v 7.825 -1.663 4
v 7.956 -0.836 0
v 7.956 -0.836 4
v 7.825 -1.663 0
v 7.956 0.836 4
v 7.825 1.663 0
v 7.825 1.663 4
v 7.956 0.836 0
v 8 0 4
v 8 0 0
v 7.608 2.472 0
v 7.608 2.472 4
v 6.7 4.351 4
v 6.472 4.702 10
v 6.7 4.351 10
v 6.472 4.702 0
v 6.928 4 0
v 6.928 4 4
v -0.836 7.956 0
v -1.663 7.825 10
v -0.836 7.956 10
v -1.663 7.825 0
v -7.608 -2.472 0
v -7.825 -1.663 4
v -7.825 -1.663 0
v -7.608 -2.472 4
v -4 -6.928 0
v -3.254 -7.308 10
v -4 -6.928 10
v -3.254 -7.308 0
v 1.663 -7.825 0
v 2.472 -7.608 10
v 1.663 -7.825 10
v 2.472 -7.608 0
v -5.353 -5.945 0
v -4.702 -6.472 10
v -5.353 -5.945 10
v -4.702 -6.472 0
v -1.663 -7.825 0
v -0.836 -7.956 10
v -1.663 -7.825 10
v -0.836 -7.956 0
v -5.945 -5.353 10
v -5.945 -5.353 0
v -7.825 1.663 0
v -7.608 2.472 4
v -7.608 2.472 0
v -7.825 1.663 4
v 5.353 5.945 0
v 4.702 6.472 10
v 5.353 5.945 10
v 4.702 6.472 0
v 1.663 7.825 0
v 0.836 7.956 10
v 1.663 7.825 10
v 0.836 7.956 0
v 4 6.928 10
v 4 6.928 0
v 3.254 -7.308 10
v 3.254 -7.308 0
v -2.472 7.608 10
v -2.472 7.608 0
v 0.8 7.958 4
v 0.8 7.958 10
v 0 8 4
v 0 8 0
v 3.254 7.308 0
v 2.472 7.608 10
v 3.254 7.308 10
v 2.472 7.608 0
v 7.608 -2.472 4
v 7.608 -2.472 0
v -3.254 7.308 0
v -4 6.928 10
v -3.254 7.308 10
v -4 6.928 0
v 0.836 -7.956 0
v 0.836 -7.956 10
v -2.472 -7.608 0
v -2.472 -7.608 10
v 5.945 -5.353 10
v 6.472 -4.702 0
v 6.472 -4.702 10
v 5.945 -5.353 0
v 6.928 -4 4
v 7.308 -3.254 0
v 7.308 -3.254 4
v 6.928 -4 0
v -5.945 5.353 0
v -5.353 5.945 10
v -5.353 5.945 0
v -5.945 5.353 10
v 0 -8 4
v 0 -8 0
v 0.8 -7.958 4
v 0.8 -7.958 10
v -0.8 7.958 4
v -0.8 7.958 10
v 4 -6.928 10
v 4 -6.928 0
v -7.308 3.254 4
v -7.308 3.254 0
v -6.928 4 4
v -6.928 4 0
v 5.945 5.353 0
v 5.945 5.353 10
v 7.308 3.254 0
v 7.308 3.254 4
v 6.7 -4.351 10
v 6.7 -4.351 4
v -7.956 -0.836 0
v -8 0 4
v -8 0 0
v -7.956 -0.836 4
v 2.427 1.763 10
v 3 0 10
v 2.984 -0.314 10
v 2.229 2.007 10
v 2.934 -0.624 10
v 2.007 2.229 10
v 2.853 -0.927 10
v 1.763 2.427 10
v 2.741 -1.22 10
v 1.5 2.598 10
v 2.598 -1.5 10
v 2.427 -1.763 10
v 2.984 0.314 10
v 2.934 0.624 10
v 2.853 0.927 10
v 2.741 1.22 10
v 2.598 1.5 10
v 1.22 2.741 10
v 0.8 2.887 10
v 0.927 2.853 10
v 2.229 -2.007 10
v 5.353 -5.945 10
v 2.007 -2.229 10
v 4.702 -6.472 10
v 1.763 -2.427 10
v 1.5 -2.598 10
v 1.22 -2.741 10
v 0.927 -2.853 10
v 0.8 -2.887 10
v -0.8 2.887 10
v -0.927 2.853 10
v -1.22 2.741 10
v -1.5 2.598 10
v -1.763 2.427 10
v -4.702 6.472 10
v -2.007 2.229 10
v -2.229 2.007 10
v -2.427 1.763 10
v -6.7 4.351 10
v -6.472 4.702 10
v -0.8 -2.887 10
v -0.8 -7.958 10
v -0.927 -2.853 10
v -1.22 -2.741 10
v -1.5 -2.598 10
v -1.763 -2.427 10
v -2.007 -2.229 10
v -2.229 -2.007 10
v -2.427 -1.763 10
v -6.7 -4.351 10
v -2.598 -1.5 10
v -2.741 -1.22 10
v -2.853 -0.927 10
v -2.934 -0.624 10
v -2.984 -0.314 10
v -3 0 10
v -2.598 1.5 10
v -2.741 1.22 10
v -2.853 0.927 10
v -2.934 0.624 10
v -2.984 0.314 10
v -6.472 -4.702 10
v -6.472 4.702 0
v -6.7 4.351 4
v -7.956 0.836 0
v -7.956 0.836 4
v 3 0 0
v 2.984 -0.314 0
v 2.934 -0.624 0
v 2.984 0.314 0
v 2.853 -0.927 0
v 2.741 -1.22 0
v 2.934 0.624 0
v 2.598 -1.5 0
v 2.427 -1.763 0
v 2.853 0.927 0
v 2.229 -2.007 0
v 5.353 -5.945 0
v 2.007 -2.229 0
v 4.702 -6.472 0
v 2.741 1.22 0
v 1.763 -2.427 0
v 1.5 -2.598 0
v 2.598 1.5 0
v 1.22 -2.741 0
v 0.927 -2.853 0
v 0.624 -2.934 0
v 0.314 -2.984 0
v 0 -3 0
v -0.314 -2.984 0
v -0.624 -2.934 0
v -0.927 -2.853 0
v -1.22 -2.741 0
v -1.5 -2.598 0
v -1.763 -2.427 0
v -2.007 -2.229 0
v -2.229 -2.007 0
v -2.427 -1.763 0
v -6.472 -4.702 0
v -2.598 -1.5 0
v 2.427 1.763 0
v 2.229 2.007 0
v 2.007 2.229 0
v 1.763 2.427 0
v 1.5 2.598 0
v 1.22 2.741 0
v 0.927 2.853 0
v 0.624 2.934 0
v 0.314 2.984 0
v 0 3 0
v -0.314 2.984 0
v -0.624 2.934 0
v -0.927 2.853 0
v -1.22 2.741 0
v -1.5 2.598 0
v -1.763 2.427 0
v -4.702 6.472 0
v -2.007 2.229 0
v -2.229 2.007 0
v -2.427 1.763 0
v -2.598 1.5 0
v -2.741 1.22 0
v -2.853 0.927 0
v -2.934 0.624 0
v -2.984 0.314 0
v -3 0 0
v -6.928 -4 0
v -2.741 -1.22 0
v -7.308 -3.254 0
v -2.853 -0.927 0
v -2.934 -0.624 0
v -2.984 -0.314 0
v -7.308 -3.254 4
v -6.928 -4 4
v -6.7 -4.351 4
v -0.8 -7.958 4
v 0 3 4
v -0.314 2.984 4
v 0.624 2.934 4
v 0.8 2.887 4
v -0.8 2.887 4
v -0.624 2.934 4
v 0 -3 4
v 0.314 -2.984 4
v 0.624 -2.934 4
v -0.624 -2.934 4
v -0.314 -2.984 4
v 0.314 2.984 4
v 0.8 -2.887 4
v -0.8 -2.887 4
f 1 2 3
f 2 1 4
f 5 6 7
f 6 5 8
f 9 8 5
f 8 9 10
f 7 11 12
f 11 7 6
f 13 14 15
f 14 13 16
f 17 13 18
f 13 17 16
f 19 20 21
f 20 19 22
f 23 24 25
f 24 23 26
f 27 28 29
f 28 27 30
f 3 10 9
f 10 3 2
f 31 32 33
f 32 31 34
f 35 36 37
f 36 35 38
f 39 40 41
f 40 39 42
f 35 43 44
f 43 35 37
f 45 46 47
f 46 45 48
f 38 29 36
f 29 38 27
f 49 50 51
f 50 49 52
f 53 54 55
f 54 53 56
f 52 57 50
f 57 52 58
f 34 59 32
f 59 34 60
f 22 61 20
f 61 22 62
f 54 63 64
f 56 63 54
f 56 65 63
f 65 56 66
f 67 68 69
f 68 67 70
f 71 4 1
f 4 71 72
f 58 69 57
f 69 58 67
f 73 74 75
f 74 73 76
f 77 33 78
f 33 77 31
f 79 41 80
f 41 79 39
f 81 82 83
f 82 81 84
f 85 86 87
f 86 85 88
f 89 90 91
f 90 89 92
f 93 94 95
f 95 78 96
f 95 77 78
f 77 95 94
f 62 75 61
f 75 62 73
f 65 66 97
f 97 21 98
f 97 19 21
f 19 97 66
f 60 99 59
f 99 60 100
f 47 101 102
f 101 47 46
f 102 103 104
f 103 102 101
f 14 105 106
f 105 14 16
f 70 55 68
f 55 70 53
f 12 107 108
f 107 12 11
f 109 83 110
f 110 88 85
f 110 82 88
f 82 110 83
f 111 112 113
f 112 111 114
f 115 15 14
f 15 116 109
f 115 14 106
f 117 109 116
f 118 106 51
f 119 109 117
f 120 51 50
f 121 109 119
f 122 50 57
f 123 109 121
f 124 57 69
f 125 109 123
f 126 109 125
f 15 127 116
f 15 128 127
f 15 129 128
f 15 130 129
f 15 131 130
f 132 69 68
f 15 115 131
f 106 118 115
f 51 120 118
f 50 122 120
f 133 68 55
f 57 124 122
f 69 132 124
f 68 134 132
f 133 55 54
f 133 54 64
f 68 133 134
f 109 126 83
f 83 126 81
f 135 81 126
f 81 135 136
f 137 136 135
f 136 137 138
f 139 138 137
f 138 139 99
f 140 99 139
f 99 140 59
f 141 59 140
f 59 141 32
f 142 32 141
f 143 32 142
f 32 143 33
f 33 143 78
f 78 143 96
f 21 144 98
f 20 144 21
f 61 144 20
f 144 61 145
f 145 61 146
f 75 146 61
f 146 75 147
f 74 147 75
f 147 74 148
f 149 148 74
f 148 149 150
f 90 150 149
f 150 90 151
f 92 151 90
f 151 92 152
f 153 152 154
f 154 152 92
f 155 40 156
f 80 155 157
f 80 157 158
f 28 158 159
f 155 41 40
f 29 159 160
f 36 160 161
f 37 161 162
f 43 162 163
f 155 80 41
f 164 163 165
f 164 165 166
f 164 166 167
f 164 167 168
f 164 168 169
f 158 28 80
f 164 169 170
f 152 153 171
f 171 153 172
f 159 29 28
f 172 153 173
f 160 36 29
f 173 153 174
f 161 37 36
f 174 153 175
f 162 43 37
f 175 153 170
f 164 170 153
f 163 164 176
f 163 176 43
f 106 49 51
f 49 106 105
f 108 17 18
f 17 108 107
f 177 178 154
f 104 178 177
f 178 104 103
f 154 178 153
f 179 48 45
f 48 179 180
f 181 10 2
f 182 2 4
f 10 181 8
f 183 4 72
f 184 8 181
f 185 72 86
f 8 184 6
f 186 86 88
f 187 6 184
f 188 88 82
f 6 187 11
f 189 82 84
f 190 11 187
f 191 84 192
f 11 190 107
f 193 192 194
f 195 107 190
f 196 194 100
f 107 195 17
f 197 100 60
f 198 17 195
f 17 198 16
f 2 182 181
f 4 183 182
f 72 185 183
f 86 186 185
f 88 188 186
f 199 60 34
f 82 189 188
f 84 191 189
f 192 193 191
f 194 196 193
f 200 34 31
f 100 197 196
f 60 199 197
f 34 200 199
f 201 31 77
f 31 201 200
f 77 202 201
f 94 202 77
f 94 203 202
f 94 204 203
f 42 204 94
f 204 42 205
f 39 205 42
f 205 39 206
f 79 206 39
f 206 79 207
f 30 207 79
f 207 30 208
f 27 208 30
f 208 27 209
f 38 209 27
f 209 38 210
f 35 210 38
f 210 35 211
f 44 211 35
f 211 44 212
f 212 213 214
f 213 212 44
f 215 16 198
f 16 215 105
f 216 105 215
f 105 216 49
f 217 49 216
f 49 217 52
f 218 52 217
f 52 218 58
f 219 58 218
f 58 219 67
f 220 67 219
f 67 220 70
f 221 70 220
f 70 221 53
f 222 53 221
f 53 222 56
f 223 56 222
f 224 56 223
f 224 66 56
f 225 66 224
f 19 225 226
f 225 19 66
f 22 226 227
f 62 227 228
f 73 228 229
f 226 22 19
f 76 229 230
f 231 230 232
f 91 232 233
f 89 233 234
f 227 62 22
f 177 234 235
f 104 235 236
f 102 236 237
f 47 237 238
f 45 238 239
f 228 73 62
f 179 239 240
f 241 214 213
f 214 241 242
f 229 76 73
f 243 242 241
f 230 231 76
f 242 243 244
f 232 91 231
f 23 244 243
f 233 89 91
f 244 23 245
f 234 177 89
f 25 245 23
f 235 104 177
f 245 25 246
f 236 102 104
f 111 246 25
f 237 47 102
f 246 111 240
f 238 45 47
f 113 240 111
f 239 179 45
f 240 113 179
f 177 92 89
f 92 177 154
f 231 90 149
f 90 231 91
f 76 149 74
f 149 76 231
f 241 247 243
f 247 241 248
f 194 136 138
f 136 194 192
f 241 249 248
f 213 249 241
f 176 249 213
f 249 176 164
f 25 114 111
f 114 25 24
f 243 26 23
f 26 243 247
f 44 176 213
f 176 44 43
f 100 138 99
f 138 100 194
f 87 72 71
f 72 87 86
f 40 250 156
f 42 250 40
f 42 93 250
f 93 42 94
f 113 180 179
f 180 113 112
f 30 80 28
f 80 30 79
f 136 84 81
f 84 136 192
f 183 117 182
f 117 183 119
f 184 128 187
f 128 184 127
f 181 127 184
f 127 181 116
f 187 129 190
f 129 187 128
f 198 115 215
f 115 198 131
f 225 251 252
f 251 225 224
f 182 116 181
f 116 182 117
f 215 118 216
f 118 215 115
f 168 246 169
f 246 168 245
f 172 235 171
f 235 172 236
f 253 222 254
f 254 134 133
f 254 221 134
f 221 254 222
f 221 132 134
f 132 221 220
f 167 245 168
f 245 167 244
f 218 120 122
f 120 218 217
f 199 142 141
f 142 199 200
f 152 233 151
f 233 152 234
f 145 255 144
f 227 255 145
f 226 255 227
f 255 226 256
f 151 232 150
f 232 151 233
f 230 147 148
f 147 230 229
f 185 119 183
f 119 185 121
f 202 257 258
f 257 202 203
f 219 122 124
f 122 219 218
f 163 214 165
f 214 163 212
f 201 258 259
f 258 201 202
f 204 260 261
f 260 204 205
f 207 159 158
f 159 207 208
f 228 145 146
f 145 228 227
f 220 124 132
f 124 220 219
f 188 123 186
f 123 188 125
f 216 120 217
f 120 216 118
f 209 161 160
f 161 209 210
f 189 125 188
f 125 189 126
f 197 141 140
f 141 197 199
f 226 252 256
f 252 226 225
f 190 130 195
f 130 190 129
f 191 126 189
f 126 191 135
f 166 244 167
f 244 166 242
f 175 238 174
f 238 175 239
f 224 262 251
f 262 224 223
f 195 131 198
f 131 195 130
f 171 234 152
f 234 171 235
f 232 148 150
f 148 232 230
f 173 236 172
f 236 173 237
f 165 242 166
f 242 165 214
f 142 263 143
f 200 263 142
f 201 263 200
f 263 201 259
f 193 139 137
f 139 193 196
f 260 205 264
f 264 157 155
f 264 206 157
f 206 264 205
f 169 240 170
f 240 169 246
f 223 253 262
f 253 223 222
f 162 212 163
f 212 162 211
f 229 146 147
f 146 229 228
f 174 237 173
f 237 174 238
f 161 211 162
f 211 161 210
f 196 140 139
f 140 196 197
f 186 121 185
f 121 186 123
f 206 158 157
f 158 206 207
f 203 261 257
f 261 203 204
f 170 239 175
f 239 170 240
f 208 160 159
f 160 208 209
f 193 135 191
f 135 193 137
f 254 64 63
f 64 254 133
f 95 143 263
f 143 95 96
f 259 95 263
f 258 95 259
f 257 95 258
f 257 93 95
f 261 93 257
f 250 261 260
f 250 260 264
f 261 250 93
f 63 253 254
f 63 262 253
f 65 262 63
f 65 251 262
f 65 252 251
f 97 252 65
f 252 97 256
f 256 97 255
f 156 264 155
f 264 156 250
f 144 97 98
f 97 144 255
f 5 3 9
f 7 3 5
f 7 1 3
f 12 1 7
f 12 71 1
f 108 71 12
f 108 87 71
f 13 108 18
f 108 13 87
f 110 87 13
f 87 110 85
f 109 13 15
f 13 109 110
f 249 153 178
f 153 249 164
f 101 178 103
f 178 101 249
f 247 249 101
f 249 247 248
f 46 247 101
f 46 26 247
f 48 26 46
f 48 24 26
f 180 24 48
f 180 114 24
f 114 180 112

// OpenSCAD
// [FL_INDEX: keywords="openscad, 3d_parametric, Wade_s_extruder_to_bowden_cable__for_every_hole, csg_solid" | COT="Parametric OpenSCAD design from 3DCodeverse"]
// Title: Wade's extruder to bowden cable, for every hole

/*I made this part to check customizer and play with openscad.
*It is based on this: http://www.thingiverse.com/thing:36240 from Petehagoras
*The dimensions for the holes are taken from jonaskuehling's openscad
* model http://www.thingiverse.com/thing:18379 (Greg's Wade reloaded)
* The dimensions are tight, so i don't know if it will work out of the box.
*Wade's to bowden cable by cr3a7ure
*I'm not familiar with licences so i'll keep the original
*/

bowden_cable_diameter = 6;// [6:3mm_Filament,4:1.75mm_Filament,3.5:Fill_that_hole]
hotend_mount_hole = 16; //[16:J_head_or_grrf_peek,12.7:Wildseyed_mount_or_Mendel_parts_v6,15:geared_extruder,10:reprapfab.org]
hole_height = 10; // [10:what_you_want,20:reprapfab.org]


difference(){
cylinder(r=hotend_mount_hole/2,h=hole_height,$fn=60);
cylinder(r=bowden_cable_diameter/2,h=hole_height,$fn=60);
translate([-1.6/2,-hotend_mount_hole/2,4]) cube([1.6,hotend_mount_hole,16]);
translate([-1.3+hotend_mount_hole/2,-hotend_mount_hole/2,4]) cube([1.3,hotend_mount_hole,16]);
translate([-hotend_mount_hole/2,-hotend_mount_hole/2,4]) cube([1.3,hotend_mount_hole,16]);
}
